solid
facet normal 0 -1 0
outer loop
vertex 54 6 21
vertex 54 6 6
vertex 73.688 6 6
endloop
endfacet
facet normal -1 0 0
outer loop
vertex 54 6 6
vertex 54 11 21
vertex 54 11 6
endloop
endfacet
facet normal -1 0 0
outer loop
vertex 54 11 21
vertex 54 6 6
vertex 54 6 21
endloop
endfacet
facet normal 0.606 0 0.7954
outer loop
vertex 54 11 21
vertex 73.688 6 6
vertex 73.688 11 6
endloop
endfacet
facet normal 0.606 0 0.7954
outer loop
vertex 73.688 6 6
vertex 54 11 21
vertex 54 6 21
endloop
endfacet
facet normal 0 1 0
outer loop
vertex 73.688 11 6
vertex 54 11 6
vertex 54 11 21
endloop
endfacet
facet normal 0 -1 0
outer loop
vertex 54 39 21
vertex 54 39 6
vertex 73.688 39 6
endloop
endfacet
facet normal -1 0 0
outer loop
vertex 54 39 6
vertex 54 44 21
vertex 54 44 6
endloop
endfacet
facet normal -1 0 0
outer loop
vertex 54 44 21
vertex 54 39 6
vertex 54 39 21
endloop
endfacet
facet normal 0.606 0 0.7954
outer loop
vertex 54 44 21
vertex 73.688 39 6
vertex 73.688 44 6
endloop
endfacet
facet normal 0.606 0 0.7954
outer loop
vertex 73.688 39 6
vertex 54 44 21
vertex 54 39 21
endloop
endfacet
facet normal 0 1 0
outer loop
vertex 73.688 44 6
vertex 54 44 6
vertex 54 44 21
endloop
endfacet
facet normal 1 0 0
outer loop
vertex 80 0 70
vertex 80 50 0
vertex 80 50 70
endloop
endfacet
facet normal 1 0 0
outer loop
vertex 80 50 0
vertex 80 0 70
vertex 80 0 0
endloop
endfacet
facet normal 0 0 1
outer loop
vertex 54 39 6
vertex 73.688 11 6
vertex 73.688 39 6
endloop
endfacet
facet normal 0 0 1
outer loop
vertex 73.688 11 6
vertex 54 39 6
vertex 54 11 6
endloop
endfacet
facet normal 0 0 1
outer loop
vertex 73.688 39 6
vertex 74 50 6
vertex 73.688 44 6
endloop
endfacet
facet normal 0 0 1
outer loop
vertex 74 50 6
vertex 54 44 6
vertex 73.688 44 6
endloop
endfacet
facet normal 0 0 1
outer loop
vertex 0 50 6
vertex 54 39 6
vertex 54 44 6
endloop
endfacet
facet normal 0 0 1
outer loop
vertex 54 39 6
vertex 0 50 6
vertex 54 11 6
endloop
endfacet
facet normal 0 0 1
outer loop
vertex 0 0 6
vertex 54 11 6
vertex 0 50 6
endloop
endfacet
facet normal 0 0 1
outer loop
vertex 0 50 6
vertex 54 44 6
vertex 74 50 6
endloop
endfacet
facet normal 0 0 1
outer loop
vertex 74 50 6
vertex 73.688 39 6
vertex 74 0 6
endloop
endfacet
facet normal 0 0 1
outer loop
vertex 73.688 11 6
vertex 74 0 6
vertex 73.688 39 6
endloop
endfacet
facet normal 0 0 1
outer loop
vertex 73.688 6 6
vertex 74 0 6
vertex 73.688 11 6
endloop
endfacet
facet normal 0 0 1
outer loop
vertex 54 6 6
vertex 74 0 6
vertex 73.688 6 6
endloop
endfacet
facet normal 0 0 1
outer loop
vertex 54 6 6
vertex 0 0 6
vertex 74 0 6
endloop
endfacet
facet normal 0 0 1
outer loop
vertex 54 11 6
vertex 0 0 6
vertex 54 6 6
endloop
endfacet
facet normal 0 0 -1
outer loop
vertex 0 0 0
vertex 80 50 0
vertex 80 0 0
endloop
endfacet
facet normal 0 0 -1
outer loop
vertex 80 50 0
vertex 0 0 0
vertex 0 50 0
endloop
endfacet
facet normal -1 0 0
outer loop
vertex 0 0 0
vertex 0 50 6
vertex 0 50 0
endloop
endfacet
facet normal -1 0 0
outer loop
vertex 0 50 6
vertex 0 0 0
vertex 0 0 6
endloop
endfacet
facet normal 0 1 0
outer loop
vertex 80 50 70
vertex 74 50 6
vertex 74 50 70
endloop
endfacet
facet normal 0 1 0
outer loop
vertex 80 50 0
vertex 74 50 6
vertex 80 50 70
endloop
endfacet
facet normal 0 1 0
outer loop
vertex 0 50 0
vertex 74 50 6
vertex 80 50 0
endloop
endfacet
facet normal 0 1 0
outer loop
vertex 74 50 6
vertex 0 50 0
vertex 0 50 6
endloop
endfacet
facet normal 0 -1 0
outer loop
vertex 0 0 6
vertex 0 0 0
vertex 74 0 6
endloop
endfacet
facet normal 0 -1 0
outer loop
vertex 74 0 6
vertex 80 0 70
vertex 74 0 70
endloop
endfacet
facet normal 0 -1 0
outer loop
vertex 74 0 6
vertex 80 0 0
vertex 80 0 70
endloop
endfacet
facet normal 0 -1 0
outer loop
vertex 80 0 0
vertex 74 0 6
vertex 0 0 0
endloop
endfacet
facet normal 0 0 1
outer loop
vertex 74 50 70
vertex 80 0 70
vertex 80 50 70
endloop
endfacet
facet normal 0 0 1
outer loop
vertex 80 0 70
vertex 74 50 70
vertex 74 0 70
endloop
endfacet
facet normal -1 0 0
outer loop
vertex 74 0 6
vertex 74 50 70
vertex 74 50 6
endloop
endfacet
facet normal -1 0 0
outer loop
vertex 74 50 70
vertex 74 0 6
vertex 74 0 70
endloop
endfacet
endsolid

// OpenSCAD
$fn = 32;

// ----------------------------------------------------------------------
// Rib bracket: 2-gusset L bracket
// ----------------------------------------------------------------------

// --- parameters (mm) ---
base_l = 80;              // foot length, X
base_w = 50;              // foot width, Y
base_t = 6;               // foot thickness
plate_t = 6;              // upright plate thickness
plate_h = 70;             // overall height
gus_l = 20;               // gusset leg along the foot
gus_h = 16;               // gusset height
gus_t = 5;                // gusset thickness
gus_edge = 6;             // gusset margin from the foot edge
n_gus = 2;                // gusset count

gus_pitch = (base_w - 2 * gus_edge - gus_t) / (n_gus - 1);  // gusset pitch

union() {
  cube([base_l, base_w, base_t]);
  translate([base_l - plate_t, 0, base_t - 1])
    cube([plate_t, base_w, plate_h - base_t + 1]);
  for (i = [0 : n_gus - 1])
    translate([base_l - plate_t - gus_l, gus_edge + i * gus_pitch, base_t - 1])
      rotate([-90, 0, 0])
        linear_extrude(height = gus_t)
          polygon(points = [[0, 0], [gus_l + 1, 0], [0, -gus_h]]);
}
